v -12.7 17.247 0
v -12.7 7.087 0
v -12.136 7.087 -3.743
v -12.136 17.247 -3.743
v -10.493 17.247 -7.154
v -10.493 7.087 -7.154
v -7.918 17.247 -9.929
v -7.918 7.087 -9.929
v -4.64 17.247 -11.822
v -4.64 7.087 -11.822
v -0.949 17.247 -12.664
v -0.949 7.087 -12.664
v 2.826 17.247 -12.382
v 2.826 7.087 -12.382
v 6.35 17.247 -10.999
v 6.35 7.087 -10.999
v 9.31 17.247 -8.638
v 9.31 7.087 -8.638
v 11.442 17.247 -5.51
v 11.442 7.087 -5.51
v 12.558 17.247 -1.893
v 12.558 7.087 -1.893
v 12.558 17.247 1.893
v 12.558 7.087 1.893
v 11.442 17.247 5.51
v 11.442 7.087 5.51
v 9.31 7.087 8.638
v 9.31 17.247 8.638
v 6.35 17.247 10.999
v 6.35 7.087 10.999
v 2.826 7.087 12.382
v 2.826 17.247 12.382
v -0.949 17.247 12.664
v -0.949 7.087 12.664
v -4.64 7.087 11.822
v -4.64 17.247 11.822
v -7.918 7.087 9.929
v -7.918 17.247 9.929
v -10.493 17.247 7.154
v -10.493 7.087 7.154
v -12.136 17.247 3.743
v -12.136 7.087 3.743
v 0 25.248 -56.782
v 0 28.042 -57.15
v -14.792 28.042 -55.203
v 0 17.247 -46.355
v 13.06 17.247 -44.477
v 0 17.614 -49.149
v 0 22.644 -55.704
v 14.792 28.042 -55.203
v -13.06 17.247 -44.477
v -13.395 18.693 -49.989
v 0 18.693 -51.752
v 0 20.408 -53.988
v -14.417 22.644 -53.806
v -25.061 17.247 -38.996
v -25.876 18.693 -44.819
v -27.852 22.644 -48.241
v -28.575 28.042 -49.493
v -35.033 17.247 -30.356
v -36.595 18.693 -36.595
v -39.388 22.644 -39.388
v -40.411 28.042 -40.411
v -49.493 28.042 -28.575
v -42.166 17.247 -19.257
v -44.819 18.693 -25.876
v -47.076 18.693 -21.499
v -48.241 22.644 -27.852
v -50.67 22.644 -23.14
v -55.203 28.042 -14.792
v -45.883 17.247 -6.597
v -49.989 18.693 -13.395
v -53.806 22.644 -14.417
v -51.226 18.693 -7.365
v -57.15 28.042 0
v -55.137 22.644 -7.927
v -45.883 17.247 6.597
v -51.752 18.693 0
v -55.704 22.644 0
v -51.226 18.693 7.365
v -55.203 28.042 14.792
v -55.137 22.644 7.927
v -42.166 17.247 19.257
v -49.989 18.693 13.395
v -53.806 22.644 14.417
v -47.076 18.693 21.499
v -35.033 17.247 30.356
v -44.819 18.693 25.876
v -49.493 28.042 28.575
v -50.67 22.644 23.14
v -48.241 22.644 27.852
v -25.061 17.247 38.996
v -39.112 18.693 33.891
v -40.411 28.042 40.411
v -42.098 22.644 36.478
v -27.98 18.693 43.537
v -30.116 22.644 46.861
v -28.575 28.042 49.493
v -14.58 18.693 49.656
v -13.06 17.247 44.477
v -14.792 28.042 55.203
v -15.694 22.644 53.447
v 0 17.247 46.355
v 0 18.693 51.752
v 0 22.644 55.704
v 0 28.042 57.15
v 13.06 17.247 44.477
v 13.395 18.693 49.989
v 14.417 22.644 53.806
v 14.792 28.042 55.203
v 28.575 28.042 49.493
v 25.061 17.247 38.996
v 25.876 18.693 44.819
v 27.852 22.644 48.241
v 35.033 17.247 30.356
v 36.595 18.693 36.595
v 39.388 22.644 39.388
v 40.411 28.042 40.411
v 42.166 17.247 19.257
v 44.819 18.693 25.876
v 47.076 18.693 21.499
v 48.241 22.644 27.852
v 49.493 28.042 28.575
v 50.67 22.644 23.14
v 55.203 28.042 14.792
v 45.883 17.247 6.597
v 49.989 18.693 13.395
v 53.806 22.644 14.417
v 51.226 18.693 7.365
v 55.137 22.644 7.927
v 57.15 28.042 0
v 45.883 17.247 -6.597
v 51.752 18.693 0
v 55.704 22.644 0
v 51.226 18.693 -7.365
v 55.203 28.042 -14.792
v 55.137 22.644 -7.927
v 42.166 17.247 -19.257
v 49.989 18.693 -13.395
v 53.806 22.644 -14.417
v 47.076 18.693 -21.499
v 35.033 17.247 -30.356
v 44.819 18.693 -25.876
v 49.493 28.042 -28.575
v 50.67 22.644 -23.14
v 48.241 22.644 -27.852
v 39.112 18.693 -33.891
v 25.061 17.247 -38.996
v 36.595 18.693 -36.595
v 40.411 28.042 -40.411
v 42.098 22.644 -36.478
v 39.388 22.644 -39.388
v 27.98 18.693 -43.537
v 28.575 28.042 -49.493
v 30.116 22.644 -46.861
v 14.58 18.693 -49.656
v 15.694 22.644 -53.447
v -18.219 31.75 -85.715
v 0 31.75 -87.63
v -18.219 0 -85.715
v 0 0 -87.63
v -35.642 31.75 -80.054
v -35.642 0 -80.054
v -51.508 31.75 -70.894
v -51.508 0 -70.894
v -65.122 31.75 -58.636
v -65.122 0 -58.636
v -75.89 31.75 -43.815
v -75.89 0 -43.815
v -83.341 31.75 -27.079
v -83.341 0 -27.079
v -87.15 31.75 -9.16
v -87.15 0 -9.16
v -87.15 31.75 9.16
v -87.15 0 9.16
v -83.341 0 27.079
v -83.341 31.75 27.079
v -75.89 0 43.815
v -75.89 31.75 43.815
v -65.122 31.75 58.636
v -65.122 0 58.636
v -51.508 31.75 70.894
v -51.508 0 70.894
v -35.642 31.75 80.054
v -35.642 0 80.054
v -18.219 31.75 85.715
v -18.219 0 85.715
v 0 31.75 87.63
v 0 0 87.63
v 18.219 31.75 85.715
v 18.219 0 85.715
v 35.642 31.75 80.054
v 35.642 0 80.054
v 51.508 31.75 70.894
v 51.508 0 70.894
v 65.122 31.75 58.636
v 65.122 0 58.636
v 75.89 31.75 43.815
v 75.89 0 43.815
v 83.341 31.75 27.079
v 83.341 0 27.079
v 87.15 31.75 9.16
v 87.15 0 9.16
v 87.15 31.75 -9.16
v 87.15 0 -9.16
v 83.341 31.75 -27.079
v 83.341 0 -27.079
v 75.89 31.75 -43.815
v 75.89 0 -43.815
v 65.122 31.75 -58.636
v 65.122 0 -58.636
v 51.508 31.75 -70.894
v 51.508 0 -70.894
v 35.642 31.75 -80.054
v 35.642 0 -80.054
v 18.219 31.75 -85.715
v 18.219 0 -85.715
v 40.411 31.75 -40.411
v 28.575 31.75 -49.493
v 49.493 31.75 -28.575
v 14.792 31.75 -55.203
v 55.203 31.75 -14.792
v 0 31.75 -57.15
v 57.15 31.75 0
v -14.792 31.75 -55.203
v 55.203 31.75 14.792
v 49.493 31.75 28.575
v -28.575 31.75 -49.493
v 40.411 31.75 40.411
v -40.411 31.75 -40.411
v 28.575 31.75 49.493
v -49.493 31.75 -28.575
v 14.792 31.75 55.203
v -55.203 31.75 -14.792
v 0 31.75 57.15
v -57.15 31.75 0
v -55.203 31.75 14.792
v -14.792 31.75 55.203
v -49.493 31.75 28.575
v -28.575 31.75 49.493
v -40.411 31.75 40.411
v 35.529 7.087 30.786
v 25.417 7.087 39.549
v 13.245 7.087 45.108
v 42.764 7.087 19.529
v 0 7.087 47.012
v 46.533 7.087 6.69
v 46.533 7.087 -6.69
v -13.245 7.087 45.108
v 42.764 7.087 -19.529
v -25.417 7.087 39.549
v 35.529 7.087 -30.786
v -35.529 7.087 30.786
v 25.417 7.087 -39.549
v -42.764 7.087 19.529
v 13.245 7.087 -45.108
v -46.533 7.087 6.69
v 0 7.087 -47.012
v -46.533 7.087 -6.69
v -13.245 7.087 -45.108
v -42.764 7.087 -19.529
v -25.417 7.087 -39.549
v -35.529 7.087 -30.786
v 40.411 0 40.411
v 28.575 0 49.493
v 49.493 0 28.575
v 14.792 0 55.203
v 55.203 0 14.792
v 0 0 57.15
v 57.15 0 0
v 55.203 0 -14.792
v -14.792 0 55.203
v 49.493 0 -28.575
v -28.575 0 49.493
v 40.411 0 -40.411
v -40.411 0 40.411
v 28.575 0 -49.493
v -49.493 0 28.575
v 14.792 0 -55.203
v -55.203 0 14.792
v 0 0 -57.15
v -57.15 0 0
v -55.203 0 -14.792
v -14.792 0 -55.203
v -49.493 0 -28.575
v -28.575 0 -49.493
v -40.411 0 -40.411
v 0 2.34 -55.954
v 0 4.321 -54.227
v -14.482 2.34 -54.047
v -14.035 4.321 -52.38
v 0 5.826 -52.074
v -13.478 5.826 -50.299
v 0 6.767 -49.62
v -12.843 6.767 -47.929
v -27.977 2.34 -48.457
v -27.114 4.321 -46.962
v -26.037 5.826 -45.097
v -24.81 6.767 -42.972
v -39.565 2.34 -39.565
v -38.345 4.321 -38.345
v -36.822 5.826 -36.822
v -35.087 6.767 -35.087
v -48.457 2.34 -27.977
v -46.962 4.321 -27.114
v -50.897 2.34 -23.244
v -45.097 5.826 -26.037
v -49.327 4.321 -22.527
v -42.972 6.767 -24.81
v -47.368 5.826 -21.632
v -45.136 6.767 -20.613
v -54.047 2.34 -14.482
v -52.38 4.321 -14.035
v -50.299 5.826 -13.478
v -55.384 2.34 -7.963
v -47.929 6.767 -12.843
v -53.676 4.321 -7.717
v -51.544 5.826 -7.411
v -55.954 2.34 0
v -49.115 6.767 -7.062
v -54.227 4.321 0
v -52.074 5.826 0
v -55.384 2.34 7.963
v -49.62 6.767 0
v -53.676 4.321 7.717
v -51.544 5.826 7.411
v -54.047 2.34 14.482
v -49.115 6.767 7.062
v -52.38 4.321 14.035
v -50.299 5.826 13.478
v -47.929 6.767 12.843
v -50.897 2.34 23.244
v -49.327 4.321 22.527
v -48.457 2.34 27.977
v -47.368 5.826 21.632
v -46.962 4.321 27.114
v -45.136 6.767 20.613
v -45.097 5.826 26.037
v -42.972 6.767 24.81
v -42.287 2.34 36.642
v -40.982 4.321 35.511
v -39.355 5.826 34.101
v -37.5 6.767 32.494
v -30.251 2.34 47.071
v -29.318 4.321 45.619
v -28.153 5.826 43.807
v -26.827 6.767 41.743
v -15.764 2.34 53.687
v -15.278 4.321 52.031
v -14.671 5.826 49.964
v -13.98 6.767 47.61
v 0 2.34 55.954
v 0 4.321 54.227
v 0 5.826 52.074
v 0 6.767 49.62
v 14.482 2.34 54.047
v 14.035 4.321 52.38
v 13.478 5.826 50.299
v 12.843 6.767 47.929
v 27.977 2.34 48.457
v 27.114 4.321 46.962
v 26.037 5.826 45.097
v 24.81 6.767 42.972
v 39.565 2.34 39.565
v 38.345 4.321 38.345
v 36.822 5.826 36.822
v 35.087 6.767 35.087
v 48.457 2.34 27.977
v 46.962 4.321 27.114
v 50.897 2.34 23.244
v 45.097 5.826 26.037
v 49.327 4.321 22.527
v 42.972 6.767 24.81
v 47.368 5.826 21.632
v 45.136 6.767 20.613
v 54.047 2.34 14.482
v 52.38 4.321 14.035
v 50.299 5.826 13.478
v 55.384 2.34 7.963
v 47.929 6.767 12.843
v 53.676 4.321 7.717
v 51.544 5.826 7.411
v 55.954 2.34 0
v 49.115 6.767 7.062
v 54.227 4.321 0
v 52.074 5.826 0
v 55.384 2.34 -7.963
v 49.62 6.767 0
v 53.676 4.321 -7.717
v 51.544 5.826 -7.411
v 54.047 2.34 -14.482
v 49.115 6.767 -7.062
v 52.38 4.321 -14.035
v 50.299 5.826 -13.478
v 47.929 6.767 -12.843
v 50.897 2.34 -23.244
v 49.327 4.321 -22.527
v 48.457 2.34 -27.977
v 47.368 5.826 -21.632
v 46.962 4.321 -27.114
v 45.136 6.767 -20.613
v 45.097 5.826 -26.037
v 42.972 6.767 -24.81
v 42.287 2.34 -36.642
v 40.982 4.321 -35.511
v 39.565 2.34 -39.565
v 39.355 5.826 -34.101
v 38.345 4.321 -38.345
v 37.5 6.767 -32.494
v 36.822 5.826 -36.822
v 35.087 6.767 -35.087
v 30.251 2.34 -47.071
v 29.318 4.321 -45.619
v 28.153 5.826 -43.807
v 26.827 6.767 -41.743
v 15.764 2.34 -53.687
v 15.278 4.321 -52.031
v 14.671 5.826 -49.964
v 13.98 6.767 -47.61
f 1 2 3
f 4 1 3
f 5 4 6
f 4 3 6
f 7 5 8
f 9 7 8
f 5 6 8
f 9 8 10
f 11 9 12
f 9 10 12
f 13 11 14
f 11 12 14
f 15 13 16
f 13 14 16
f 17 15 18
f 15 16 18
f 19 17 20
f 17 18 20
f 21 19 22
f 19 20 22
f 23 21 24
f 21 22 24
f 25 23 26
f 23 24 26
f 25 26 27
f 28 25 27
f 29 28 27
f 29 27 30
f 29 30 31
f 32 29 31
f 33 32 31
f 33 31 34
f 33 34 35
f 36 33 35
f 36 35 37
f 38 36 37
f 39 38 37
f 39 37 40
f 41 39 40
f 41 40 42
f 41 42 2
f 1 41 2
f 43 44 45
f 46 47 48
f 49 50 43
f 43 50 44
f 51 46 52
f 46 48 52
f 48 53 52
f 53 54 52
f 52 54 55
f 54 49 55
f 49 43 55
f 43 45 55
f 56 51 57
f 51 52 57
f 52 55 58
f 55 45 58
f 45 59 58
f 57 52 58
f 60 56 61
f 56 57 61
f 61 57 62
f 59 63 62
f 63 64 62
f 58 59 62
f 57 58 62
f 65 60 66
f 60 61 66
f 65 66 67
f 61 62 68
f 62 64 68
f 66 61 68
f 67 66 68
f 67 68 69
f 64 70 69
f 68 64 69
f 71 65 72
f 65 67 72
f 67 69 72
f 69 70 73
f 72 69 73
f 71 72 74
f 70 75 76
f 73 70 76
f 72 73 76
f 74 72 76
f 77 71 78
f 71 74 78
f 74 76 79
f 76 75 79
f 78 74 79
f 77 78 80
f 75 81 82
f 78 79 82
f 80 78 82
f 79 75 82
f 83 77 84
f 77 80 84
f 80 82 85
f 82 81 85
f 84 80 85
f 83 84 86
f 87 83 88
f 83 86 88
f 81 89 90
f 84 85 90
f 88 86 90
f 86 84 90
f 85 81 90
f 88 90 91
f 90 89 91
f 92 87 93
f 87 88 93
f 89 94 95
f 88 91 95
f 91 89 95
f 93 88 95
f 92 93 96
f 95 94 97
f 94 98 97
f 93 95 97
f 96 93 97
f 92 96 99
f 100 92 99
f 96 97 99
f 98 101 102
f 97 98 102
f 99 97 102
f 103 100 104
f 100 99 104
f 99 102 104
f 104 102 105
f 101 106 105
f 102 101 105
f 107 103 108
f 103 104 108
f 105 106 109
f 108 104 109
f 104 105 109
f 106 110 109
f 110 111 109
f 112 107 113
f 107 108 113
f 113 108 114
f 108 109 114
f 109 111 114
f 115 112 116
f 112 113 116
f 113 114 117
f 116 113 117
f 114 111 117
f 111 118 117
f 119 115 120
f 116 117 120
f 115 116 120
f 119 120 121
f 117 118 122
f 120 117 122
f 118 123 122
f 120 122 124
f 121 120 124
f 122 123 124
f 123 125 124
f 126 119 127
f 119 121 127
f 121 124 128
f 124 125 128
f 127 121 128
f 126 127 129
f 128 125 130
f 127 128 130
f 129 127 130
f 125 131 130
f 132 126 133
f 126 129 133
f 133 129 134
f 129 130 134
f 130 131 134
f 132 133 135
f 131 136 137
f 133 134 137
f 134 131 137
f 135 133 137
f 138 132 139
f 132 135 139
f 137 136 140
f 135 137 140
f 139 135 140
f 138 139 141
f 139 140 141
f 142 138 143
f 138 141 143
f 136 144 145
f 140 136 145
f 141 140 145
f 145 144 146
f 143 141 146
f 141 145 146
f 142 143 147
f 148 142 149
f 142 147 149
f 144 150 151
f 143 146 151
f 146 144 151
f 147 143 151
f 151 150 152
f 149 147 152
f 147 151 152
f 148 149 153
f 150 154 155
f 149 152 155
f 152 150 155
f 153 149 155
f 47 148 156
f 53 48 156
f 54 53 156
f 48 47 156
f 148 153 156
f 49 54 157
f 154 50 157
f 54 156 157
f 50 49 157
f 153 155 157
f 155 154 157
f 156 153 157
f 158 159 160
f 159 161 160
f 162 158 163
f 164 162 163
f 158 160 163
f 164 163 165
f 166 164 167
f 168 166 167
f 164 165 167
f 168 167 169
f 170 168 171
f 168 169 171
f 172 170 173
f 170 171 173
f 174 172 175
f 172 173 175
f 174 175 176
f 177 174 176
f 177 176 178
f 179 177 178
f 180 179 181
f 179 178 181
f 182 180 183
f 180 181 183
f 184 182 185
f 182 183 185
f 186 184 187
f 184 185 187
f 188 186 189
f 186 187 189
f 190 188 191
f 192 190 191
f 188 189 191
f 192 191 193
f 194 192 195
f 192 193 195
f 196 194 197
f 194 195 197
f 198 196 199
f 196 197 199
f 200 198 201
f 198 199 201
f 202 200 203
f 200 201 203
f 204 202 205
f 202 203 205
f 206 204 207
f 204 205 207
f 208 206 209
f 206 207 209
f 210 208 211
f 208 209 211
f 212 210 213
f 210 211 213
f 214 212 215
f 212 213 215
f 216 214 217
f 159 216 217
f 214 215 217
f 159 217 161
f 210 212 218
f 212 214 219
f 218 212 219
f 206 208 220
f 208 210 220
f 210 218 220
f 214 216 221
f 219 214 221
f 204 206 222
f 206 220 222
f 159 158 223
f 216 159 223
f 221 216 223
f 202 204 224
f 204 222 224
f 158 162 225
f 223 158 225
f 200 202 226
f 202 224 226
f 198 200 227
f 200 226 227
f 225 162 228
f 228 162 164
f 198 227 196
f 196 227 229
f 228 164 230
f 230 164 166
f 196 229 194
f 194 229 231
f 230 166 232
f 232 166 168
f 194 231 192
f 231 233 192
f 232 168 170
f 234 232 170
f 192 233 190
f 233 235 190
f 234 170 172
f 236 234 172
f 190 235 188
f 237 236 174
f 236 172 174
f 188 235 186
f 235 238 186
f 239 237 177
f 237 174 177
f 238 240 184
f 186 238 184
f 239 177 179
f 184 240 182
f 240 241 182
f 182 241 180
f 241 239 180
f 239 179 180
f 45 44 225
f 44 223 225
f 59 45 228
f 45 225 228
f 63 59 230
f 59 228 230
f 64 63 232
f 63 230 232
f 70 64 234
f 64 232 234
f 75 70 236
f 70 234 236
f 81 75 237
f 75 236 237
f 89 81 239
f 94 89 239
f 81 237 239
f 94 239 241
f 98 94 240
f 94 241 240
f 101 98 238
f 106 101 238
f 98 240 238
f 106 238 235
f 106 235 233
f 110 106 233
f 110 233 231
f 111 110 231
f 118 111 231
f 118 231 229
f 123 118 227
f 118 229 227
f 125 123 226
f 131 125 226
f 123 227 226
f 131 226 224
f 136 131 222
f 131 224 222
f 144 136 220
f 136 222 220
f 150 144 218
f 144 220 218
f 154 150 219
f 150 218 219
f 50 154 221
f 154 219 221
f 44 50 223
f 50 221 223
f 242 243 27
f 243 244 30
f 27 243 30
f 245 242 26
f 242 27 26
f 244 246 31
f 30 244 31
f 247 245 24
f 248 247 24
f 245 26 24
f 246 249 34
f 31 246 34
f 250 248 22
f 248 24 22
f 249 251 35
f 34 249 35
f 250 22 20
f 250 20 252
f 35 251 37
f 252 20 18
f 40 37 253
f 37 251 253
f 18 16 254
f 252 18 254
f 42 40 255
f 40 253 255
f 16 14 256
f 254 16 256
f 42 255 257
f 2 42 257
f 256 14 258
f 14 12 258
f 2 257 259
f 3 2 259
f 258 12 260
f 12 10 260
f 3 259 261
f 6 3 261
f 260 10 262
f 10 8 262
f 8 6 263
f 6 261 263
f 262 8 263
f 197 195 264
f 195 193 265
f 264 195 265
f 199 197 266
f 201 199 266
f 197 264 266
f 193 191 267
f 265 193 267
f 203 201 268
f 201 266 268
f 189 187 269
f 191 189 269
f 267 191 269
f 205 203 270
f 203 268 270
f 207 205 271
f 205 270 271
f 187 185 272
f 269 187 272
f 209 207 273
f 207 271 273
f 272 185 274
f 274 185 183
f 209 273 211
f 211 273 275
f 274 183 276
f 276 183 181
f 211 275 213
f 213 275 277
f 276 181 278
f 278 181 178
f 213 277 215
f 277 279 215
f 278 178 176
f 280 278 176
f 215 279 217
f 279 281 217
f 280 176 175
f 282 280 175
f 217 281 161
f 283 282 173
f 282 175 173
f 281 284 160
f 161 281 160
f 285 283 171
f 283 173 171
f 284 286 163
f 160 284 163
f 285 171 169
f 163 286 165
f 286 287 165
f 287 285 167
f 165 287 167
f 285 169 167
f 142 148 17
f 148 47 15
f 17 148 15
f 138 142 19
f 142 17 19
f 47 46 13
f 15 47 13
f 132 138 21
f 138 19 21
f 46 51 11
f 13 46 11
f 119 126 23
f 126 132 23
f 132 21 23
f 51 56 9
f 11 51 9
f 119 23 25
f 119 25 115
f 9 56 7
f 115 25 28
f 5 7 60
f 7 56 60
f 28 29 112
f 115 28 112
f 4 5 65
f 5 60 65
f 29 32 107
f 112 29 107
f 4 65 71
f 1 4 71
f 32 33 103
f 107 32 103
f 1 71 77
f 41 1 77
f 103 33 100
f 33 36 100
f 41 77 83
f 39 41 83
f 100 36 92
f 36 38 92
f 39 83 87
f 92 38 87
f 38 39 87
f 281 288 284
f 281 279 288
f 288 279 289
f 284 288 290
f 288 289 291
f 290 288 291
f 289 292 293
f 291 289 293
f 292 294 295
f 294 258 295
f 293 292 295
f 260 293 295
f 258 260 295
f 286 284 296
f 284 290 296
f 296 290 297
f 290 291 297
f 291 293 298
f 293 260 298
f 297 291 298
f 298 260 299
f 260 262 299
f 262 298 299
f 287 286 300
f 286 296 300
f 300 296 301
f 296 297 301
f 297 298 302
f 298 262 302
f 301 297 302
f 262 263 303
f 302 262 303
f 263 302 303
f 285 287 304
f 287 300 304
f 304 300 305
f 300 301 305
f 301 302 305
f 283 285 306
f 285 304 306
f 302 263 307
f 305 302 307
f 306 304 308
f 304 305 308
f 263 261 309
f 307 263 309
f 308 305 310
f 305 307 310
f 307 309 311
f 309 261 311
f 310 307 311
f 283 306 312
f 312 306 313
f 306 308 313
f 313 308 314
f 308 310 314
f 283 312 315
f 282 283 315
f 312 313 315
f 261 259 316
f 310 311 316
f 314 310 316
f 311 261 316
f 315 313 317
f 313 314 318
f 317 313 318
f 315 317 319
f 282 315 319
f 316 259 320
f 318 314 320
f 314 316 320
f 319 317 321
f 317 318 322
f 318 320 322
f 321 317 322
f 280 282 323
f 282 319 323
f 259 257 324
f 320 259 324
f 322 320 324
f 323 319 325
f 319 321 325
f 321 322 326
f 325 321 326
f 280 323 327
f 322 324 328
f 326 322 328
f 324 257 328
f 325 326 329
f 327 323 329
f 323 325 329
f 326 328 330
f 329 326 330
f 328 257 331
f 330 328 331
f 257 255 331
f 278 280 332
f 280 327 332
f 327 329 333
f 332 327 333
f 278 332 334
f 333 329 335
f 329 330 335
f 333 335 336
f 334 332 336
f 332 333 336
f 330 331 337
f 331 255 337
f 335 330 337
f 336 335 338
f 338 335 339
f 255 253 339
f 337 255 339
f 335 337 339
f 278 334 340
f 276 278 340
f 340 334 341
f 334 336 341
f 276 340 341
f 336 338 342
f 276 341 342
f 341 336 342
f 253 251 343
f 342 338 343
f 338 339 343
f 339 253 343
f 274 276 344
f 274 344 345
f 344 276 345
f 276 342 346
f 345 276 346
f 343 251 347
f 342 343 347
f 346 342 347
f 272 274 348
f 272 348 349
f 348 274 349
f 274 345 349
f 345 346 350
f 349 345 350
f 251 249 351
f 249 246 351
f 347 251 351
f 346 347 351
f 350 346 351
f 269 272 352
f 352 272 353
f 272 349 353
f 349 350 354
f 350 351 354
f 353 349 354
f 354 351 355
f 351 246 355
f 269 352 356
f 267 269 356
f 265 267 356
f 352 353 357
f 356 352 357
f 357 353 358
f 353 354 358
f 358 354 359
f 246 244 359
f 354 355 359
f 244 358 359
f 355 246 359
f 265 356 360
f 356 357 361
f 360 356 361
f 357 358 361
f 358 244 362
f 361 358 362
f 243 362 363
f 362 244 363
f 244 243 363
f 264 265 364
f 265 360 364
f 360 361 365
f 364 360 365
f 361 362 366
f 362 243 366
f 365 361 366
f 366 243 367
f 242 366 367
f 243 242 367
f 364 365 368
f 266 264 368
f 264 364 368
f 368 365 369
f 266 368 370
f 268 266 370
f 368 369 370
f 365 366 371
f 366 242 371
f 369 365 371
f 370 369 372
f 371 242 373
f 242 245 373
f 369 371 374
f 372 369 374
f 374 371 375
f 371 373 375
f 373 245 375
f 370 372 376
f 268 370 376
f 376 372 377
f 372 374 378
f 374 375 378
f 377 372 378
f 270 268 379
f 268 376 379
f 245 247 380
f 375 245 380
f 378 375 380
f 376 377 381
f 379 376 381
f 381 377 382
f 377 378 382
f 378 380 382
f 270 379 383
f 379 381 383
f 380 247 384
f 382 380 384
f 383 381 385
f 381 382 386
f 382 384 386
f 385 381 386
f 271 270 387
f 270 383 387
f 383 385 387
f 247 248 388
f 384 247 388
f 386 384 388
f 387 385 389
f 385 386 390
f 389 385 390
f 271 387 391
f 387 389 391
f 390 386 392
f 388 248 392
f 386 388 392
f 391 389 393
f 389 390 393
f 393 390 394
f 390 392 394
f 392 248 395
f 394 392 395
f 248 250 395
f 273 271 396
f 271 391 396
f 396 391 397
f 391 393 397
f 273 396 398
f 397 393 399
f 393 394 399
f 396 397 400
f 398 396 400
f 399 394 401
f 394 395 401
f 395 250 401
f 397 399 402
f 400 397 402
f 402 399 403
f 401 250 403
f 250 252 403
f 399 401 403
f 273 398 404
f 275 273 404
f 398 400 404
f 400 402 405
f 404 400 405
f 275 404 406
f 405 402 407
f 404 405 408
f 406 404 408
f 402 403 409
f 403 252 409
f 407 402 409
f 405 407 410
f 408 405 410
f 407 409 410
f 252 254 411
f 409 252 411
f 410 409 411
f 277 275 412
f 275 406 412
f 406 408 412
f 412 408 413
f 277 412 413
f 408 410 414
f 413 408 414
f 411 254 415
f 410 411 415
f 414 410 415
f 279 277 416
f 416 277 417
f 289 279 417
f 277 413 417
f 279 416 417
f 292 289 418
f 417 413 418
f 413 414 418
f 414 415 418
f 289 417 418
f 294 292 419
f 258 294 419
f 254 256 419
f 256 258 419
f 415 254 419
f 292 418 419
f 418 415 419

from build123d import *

# Parameters (mm, degrees)
FILLET2_R              = 10.795
F_1_1_DIAMETER_HOLE1_D = 25.4


with BuildPart() as part:
    # Sketch1 → Revolve1 (revolve)
    with BuildSketch(Plane.XY, mode=Mode.PRIVATE) as revolve1_sk:
        Polygon((87.63, 0), (57.15, 0), (57.15, 7.0866), (0, 7.0866), (0, 17.2466), (57.15, 17.2466), (57.15, 31.75), (87.63, 31.75), align=None)
    revolve(revolve1_sk.sketch.rotate(Axis((0, 7.0866, 0), (0, 1, 0)), 90), axis=Axis((0, 7.0866, 0), (0, 1, 0)))

    # Fillet2
    # the kernel refuses this fillet: 10.795 mm, written as the material it adds along each edge
    with BuildSketch(Plane(origin=(0, 17.2466, 0), x_dir=(0, 0, -1), z_dir=(1, 0, 0))) as fillet2_piece_1:
        with BuildLine():
            CenterArc((57.15 - FILLET2_R, FILLET2_R), FILLET2_R, 270, 90)
            Line((57.15, FILLET2_R), (57.15 + FILLET2_R * 0.02, FILLET2_R))
            Line((57.15 + FILLET2_R * 0.02, FILLET2_R), (57.15 + FILLET2_R * 0.02, -FILLET2_R * 0.02))
            Line((57.15 + FILLET2_R * 0.02, -FILLET2_R * 0.02), (57.15 - FILLET2_R, -FILLET2_R * 0.02))
            Line((57.15 - FILLET2_R, -FILLET2_R * 0.02), (57.15 - FILLET2_R, 0))
        make_face()
    revolve(axis=Axis((0, 17.2466, 0), (0, 1, 0)))
    with BuildSketch(Plane(origin=(0, 7.0866, 0), x_dir=(0, 0, -1), z_dir=(1, 0, 0))) as fillet2_piece_2:
        with BuildLine():
            CenterArc((47.011962989, -10.795), FILLET2_R, 20.092051419, 69.907948581)
            Line((47.011962989, 0), (47.011962989, 0.2159))
            Line((47.011962989, 0.2159), (57.15, 0.2159))
            Line((57.15, 0.2159), (57.3659, 0))
            ThreePointArc((57.3659, 0), (57.3659, -3.5433), (57.35276074, -7.012432))
            Line((57.35276074, -7.012432), (57.15, -7.0866))
        make_face()
    revolve(axis=Axis((0, 7.0866, 0), (0, 1, 0)))

    # 1 (1) Diameter Hole1 (through all)
    with Locations(Plane(origin=(0, 17.2466, 0), x_dir=(1, 0, 0), z_dir=(0, 1, 0))):
        with Locations((0, 0)):
            Hole(F_1_1_DIAMETER_HOLE1_D / 2)


solid = part.part
